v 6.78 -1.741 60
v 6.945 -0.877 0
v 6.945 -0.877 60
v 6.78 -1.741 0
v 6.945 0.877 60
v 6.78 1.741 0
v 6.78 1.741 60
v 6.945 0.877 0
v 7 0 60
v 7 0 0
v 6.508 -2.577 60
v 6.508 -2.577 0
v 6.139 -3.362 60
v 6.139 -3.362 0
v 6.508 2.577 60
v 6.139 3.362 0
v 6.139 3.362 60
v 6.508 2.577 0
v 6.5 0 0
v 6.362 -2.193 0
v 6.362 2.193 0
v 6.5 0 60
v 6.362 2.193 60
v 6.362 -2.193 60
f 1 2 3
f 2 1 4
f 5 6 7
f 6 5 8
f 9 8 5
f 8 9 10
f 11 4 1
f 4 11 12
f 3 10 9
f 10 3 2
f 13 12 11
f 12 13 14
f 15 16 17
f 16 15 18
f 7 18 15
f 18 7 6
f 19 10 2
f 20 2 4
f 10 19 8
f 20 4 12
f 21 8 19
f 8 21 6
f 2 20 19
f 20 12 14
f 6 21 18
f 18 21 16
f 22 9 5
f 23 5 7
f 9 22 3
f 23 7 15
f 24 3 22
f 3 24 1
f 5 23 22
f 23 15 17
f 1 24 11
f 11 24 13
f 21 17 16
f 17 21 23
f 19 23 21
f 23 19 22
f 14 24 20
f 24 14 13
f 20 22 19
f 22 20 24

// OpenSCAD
$fn = 50;


difference() {
	union() {
		cylinder(h = 60, r = 7.0000000000);
		translate(v = [-14.0000000000, 0, 0]) {
			cylinder(h = 60, r = 7.0000000000);
		}
	}
	union() {
		cylinder(h = 60, r = 3.2500000000);
		cylinder(h = 60, r = 1.8000000000);
		cylinder(h = 60, r = 1.8000000000);
		cylinder(h = 60, r = 1.8000000000);
		translate(v = [-18.5000000000, 0, 0]) {
			hull() {
				translate(v = [-3.7500000000, 0.0000000000, 0]) {
					cylinder(h = 60, r = 7.5000000000);
				}
				translate(v = [3.7500000000, 0.0000000000, 0]) {
					cylinder(h = 60, r = 7.5000000000);
				}
				translate(v = [-3.7500000000, -0.0000000000, 0]) {
					cylinder(h = 60, r = 7.5000000000);
				}
				translate(v = [3.7500000000, -0.0000000000, 0]) {
					cylinder(h = 60, r = 7.5000000000);
				}
			}
		}
		translate(v = [-11.0000000000, 0, 0.0000000000]) {
			cylinder(h = 60, r = 17.5000000000);
		}
	}
}
